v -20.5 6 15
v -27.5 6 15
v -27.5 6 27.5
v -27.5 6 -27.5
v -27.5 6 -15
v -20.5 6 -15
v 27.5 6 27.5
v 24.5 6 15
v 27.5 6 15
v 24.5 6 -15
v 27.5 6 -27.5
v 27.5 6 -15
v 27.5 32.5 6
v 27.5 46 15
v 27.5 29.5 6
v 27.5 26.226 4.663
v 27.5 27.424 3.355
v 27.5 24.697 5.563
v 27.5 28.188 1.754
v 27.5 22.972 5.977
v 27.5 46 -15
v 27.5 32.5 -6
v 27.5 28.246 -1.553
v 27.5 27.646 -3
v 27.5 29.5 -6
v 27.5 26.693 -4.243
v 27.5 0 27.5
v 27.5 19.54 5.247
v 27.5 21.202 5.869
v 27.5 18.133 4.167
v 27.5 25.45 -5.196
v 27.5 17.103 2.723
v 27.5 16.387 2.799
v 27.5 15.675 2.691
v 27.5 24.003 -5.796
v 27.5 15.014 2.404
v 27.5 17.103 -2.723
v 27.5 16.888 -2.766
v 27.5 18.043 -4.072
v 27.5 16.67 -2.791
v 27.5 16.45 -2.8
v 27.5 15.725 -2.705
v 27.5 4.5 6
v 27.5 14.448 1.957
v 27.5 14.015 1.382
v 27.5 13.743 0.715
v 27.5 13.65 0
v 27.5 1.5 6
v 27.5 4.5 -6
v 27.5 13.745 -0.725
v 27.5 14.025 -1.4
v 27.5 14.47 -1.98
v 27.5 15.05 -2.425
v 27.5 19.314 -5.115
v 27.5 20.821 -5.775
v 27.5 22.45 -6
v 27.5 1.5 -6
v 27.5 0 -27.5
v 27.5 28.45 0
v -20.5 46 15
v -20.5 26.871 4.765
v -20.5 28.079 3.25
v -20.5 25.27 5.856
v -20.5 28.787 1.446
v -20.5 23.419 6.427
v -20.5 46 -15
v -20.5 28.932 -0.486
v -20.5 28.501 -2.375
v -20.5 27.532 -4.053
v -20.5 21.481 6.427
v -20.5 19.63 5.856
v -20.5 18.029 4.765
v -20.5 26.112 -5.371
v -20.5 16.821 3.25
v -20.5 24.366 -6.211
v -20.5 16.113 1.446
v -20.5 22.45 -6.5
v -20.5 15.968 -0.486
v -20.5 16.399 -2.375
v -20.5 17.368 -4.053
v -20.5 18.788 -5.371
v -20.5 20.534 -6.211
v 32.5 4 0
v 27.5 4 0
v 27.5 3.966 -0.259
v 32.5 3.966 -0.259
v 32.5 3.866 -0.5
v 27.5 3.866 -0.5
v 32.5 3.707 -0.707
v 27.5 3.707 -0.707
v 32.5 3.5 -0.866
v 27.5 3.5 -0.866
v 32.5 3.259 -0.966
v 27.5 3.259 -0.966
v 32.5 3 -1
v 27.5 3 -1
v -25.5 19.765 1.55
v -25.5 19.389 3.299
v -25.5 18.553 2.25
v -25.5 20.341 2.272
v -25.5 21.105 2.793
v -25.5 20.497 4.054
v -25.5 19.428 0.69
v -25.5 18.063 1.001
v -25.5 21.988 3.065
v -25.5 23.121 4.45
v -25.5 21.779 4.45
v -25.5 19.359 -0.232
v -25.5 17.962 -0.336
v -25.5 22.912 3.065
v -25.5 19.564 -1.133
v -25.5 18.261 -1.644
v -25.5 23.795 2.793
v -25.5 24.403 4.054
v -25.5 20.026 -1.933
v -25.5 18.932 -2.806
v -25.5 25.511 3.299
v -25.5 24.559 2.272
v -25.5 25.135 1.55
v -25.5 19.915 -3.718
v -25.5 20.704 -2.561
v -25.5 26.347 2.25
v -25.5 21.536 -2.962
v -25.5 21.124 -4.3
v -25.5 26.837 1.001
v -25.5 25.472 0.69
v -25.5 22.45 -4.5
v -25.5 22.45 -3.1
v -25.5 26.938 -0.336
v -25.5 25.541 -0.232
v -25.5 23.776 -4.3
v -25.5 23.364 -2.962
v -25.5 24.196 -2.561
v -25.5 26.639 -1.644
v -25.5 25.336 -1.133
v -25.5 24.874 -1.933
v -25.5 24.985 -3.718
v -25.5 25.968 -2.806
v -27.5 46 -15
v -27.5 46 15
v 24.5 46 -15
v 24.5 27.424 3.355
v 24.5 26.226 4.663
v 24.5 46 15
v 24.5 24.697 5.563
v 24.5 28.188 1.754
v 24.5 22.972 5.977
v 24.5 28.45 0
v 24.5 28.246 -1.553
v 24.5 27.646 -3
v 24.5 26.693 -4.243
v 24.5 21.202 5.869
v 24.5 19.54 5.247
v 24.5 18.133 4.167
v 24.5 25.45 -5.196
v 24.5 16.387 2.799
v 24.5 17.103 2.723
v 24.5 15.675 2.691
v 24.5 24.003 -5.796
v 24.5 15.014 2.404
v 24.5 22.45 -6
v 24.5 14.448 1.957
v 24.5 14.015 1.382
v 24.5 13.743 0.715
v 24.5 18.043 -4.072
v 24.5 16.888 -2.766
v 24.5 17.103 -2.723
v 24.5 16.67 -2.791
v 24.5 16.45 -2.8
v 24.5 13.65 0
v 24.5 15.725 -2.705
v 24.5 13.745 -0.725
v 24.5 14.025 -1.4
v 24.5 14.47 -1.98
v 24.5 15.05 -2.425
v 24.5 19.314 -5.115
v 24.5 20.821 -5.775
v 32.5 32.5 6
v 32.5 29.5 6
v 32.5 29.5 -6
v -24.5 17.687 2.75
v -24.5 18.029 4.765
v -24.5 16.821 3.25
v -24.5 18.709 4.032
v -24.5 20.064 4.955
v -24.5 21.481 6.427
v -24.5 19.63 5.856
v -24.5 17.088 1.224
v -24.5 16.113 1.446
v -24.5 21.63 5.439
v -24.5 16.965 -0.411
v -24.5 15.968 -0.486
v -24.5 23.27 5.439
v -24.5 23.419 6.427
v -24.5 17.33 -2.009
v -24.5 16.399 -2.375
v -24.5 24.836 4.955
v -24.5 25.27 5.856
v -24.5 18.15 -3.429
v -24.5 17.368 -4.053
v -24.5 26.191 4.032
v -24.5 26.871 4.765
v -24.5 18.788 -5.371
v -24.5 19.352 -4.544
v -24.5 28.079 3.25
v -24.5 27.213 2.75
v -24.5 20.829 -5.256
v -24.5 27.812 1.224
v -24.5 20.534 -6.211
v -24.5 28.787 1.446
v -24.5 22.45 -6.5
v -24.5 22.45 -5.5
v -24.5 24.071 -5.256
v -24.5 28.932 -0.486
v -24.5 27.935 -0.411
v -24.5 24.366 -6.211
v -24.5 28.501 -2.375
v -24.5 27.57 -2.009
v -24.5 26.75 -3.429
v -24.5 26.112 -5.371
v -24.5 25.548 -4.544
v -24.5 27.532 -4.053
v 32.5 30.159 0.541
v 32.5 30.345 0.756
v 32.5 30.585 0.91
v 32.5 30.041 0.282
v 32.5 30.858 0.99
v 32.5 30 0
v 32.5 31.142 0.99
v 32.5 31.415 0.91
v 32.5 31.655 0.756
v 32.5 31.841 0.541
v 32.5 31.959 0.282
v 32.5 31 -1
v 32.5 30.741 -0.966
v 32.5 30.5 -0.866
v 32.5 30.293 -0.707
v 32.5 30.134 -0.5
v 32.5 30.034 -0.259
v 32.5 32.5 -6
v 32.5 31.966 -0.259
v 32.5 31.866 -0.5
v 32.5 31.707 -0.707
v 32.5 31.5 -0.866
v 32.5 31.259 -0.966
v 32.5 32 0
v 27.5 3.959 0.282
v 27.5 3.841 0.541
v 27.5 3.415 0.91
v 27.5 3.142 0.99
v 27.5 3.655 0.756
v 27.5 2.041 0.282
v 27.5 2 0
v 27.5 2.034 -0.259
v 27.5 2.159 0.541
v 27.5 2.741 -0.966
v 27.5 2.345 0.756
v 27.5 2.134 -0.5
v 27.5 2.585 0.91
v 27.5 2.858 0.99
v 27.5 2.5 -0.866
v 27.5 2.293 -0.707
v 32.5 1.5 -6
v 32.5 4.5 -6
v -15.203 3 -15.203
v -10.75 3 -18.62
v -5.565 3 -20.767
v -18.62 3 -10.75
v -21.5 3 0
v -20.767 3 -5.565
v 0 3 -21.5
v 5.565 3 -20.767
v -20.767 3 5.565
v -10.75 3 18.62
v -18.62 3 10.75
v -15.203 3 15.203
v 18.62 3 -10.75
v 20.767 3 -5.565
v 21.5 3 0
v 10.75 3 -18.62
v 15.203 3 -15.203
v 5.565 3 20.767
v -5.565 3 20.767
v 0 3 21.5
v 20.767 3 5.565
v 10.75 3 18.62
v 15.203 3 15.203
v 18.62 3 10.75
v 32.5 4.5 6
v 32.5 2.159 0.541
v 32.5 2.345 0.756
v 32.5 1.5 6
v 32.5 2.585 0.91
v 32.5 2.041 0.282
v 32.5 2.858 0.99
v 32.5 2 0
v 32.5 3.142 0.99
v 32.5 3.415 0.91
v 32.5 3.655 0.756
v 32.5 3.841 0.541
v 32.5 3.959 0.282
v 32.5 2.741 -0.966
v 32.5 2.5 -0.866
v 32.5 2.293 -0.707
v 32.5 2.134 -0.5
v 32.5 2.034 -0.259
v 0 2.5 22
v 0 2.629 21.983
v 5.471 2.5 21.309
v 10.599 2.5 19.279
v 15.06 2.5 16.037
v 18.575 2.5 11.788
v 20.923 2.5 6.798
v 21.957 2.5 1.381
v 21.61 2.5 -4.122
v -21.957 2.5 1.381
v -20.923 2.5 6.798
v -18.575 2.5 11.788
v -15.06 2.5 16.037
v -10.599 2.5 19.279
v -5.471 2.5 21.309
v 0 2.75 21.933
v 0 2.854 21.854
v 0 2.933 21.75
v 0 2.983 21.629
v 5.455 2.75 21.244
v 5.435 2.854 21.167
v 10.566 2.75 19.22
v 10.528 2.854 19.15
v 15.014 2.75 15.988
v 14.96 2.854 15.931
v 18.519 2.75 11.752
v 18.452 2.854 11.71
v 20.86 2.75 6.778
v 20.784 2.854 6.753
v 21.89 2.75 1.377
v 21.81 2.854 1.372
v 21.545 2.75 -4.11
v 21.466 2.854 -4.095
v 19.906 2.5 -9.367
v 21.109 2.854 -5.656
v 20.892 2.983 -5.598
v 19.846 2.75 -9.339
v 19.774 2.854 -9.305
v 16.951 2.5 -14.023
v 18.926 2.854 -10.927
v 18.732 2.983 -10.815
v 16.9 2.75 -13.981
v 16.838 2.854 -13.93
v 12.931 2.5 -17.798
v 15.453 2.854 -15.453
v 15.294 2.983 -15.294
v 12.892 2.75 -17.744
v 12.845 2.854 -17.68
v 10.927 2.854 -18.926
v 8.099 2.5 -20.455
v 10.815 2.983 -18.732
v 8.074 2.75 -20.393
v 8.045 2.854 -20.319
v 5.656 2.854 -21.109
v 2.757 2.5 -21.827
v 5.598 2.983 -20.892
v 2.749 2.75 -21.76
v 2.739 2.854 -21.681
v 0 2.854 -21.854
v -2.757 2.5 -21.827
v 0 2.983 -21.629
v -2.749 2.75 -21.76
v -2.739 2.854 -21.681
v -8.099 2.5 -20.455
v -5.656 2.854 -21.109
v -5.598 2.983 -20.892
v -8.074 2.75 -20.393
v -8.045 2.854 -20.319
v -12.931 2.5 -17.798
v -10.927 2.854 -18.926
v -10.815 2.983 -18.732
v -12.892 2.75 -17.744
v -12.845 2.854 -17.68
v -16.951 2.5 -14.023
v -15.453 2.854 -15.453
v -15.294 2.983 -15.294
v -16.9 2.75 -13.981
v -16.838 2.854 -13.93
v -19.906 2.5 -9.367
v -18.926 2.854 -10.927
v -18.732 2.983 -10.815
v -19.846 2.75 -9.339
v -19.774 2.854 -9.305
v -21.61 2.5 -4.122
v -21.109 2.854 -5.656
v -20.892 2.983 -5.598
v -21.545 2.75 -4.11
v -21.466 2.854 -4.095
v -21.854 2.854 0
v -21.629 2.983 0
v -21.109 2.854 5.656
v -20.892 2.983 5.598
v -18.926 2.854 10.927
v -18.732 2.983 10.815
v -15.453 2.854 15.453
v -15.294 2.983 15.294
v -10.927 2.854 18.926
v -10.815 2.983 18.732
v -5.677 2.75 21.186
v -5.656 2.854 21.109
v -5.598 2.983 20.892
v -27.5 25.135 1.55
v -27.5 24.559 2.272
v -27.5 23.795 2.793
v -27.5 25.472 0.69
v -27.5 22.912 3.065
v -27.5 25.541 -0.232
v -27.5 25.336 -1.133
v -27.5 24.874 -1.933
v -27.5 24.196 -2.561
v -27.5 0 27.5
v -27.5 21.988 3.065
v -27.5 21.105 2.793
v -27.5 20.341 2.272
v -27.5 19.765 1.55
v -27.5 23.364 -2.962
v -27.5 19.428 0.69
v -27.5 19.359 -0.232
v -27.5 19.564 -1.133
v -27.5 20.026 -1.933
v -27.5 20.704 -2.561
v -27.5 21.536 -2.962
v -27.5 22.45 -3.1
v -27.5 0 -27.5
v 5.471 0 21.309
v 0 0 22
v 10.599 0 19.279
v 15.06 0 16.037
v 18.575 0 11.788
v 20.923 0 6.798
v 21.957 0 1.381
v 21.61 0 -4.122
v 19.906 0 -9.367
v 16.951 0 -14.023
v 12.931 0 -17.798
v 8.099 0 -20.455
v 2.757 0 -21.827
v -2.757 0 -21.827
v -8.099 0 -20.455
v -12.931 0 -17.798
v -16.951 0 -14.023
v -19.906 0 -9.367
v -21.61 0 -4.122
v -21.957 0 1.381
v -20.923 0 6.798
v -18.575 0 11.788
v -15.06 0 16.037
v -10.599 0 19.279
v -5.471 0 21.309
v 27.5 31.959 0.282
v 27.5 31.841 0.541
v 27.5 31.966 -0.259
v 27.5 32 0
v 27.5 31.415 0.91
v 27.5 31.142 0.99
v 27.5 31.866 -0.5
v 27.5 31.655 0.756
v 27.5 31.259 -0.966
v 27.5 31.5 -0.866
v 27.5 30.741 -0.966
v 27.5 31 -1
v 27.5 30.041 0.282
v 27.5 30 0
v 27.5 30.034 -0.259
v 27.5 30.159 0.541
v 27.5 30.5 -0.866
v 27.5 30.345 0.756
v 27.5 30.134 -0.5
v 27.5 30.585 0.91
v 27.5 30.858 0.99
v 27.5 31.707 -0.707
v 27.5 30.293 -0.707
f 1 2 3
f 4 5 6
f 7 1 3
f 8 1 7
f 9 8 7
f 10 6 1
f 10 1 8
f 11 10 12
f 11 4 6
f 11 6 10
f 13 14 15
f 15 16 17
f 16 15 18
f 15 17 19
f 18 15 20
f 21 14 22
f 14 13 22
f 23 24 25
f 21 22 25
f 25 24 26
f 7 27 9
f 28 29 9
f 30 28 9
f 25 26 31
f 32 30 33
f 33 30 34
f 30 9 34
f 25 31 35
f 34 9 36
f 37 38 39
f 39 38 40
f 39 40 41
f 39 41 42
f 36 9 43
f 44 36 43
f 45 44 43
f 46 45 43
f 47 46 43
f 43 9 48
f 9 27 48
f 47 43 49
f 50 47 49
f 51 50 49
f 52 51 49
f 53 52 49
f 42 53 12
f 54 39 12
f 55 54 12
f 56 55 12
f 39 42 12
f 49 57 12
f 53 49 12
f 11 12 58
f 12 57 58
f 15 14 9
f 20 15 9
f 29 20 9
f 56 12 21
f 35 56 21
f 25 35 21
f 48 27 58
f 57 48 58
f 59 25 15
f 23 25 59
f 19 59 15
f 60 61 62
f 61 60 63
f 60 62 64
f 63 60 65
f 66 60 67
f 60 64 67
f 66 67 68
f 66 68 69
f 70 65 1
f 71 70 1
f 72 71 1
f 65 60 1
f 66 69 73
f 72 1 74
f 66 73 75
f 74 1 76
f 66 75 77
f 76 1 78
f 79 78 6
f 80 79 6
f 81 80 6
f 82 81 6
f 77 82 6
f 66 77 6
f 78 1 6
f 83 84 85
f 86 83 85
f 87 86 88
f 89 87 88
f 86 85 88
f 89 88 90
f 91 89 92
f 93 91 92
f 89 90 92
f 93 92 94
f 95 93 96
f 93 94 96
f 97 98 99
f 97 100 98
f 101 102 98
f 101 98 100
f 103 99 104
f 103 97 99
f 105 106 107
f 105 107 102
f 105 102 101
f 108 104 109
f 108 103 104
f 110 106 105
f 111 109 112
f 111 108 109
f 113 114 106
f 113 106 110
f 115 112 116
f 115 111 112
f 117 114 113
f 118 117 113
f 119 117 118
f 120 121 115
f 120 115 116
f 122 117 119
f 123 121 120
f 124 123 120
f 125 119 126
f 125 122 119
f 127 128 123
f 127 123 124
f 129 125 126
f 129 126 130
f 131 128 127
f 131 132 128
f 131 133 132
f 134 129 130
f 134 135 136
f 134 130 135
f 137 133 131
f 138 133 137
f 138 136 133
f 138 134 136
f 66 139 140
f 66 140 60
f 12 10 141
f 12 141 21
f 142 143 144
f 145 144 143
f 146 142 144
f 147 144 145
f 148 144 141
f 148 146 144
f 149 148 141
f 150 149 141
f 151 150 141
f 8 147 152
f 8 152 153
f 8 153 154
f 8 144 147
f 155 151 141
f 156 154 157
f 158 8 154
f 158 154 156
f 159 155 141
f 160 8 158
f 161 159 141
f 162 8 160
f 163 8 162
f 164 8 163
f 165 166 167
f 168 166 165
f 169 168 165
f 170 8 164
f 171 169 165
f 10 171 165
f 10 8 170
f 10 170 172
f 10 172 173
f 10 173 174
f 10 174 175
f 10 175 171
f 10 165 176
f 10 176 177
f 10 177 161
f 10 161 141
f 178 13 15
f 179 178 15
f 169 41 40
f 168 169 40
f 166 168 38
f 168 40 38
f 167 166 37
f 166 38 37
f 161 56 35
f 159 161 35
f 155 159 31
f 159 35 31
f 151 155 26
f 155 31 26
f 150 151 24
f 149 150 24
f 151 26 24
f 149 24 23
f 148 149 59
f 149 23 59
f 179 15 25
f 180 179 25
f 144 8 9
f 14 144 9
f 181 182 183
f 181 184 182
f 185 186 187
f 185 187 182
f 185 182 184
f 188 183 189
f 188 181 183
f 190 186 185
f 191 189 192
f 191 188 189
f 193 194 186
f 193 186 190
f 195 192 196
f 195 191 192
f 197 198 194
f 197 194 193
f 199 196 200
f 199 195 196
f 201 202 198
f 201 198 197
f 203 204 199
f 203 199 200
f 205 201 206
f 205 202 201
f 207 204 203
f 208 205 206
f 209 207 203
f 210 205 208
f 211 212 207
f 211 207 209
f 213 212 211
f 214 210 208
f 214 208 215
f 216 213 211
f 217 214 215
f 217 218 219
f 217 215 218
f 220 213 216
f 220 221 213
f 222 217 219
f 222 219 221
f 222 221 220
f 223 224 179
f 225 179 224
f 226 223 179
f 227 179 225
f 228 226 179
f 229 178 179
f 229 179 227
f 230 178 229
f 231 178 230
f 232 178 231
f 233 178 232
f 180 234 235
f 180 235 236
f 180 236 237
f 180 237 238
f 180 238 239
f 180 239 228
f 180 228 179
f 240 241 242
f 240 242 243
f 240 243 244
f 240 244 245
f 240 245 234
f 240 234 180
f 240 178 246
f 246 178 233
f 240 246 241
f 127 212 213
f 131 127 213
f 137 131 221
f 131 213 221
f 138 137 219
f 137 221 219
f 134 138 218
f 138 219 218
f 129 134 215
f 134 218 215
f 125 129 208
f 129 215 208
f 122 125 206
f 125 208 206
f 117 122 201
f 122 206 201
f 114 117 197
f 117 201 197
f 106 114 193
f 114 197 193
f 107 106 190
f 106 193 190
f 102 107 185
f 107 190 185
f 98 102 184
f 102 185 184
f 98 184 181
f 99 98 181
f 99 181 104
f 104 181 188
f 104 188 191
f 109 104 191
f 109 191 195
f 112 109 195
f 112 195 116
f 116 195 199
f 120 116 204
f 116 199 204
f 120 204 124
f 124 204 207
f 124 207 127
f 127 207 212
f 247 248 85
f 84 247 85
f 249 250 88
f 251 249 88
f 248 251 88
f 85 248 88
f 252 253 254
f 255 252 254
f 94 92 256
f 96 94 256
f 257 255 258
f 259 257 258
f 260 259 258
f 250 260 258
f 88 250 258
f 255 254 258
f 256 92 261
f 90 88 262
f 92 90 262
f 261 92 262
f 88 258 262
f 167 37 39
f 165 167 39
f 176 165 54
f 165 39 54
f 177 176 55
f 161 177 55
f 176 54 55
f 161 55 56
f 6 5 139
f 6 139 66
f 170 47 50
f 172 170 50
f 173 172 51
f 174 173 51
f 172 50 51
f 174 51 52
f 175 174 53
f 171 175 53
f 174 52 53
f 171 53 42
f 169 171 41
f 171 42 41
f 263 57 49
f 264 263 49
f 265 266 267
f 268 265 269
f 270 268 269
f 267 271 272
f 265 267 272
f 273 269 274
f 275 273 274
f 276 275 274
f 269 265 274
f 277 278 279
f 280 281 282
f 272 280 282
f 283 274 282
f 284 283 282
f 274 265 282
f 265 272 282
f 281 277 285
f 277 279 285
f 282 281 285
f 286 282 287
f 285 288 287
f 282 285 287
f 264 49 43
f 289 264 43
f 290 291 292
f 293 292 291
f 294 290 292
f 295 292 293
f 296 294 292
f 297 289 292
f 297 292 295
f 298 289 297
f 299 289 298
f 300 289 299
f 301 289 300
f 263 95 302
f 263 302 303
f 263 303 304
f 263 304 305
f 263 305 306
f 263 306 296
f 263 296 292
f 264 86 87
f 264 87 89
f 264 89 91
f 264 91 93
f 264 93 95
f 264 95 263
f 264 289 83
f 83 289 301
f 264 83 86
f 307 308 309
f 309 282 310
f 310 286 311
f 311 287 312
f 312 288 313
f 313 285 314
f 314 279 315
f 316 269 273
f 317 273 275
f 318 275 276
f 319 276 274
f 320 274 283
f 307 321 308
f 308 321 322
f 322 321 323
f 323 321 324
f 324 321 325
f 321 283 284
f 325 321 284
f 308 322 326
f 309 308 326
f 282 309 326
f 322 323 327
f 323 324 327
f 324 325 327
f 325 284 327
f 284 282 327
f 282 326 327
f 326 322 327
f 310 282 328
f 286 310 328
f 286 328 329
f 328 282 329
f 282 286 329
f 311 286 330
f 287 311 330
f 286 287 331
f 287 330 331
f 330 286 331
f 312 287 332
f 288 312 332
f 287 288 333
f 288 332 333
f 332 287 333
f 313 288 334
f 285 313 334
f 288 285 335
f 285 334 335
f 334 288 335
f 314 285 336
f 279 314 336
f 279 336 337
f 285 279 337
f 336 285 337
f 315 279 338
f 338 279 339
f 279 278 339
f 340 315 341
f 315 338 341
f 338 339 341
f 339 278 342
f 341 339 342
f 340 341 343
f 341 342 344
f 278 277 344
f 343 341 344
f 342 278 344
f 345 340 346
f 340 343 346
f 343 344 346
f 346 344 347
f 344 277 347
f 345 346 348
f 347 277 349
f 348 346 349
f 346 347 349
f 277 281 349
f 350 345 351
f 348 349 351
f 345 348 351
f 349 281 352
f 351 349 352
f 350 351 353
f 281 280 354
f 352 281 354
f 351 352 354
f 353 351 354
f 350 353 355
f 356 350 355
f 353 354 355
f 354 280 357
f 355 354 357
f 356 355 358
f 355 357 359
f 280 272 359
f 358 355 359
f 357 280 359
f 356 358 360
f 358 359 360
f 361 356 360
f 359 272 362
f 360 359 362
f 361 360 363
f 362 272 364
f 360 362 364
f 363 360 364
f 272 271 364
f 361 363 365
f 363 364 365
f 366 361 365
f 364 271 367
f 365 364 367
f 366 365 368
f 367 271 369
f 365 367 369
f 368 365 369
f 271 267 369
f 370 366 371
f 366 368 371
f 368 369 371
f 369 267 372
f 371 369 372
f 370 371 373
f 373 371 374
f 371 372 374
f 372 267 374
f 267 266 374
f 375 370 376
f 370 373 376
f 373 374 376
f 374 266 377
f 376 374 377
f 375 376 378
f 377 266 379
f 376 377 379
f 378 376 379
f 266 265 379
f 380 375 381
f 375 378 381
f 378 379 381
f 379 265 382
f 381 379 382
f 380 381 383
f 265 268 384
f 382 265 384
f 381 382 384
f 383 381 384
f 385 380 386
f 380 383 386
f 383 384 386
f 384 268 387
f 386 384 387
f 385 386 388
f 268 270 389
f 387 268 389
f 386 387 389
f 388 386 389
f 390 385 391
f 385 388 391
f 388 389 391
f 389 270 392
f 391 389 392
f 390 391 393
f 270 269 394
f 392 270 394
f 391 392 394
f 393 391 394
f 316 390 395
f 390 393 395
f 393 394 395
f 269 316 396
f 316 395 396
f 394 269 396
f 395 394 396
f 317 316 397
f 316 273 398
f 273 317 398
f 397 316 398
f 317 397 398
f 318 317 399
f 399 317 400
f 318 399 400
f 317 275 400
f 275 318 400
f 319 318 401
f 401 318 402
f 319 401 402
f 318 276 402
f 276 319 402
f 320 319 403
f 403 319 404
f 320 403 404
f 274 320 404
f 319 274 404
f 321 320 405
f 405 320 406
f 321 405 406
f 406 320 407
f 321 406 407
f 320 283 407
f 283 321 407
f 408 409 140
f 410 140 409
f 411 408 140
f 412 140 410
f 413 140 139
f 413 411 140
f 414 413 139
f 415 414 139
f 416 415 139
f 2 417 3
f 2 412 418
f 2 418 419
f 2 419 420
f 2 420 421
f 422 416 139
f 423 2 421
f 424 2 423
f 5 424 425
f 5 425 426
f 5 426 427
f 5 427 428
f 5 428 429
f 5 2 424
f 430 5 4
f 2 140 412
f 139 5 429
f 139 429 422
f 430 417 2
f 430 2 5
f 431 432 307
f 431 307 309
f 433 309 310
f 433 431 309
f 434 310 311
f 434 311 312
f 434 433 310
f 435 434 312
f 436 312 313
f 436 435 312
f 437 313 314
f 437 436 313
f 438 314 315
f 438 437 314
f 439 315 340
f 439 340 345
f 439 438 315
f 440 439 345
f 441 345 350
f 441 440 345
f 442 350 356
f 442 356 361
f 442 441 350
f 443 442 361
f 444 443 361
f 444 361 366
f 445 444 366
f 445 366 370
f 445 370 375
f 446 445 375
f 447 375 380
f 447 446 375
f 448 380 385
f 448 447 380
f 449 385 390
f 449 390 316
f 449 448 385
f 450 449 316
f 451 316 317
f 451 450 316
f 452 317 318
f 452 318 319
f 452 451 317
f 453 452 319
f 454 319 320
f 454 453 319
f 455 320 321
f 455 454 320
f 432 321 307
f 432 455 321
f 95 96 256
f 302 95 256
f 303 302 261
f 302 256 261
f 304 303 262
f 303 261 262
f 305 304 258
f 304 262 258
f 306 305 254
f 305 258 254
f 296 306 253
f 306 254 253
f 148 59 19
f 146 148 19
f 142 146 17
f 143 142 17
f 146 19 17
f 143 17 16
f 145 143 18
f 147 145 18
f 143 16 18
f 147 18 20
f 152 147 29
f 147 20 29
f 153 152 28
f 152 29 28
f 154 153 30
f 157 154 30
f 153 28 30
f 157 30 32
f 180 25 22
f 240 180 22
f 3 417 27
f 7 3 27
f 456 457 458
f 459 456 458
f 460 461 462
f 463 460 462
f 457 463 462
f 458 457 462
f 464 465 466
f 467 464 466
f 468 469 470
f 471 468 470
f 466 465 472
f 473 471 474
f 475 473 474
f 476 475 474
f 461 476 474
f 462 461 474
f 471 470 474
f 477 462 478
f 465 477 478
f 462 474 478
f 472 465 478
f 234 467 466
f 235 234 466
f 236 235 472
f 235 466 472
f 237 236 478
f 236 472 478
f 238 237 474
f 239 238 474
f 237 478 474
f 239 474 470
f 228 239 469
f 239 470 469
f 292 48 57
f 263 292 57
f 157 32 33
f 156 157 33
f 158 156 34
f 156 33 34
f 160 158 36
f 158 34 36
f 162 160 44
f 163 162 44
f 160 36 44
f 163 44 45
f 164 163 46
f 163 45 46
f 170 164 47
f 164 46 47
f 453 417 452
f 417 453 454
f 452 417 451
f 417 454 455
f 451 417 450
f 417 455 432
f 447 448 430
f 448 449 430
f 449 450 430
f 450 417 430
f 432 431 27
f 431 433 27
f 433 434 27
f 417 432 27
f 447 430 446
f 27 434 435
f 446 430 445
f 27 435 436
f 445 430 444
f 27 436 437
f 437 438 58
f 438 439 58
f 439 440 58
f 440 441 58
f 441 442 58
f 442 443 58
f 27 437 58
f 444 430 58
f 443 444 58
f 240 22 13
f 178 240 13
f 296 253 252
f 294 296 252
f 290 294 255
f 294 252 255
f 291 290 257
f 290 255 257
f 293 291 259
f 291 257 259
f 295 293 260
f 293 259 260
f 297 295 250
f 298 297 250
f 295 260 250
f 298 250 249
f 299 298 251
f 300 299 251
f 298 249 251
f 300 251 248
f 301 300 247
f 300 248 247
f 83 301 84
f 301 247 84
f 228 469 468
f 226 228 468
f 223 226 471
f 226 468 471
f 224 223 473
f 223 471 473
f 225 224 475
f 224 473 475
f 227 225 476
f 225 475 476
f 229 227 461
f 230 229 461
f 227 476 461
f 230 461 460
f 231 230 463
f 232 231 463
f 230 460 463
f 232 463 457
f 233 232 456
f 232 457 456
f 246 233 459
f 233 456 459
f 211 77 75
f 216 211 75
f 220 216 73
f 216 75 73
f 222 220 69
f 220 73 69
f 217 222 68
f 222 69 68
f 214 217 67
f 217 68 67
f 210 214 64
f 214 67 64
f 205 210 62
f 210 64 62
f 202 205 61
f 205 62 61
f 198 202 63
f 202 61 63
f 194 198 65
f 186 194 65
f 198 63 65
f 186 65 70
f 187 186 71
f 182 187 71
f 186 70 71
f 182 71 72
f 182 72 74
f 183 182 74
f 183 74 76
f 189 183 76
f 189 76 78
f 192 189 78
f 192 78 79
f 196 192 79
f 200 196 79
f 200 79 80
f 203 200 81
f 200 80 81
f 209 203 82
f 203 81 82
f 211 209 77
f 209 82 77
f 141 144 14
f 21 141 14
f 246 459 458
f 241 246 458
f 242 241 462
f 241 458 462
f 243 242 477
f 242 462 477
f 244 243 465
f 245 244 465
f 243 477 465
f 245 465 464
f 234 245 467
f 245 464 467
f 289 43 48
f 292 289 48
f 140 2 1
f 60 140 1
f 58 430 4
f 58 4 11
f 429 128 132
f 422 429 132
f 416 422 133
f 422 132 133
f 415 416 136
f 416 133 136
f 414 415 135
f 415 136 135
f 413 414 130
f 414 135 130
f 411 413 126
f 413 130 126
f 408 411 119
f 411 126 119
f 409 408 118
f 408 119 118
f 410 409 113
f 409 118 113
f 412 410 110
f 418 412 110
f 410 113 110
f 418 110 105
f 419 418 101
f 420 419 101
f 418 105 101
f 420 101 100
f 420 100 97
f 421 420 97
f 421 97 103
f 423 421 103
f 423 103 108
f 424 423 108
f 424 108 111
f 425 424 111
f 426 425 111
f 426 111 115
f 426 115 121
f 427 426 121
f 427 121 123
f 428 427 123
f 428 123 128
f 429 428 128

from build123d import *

# Parameters (mm, degrees)
CROQUIS8_W              = 55
CROQUIS8_H              = 55
CROQUIS8_R              = 22
SALIENTE_EXTRUIR4_DEPTH = 6
CROQUIS8_3_R            = 22
CORTAR_EXTRUIR6_DEPTH   = 3
REDONDEO1_R             = 0.5
CROQUIS9_W              = 7
CROQUIS9_H              = 30
CROQUIS9_W_2            = 3
SALIENTE_EXTRUIR5_DEPTH = 40
SALIENTE_EXTRUIR6_DEPTH = 5
CORTAR_EXTRUIR7_DEPTH   = 5
CORTAR_EXTRUIR8_REACH   = 77.374
CROQUIS11_R             = 3.1
CROQUIS11_3_R           = 6.5
CORTAR_EXTRUIR9_DEPTH   = 4
CROQUIS12_R             = 5.5
CROQUIS12_R_2           = 3.1
CORTAR_EXTRUIR10_DEPTH  = 1
CHAFL_N1_SIZE           = 1


with BuildPart() as part:
    # Croquis8 → Saliente-Extruir4 (new body)
    # profile 1 of 2: a face of its own
    with BuildSketch(Plane(origin=(0, 0, 0), x_dir=(1, 0, 0), z_dir=(0, 1, 0))):
        Rectangle(CROQUIS8_W, CROQUIS8_H)
        Circle(CROQUIS8_R, mode=Mode.SUBTRACT)
    # profile 2 of 2: a face of its own
    with BuildSketch(Plane(origin=(0, 0, 0), x_dir=(1, 0, 0), z_dir=(0, 1, 0))):
        Circle(CROQUIS8_R)
    extrude(amount=SALIENTE_EXTRUIR4_DEPTH)

    # Croquis8<3> → Cortar-Extruir6 (cut)
    with BuildSketch(Plane(origin=(0, 0, 0), x_dir=(1, 0, 0), z_dir=(0, 1, 0))):
        with Locations(Location((0, 0, 0), (0, 0, 270))):
            Circle(CROQUIS8_3_R)
    extrude(amount=CORTAR_EXTRUIR6_DEPTH, mode=Mode.SUBTRACT)

    # Redondeo1
    redondeo1_edges = [part.edges().sort_by_distance(p)[0] for p in [
        (0, 3, -22),
    ]]
    fillet(redondeo1_edges, radius=REDONDEO1_R)

    # Croquis9 → Saliente-Extruir5 (add)
    with BuildSketch(Plane(origin=(0, 6, 0), x_dir=(1, 0, 0), z_dir=(0, 1, 0))):
        with Locations((-24, 0)):
            Rectangle(CROQUIS9_W, CROQUIS9_H)
        with Locations((26, 0)):
            Rectangle(CROQUIS9_W_2, CROQUIS9_H)
    extrude(amount=SALIENTE_EXTRUIR5_DEPTH)

    # Croquis10 → Saliente-Extruir6 (add)
    with BuildSketch(Plane(origin=(27.5, 0, 0), x_dir=(0, 0, -1), z_dir=(1, 0, 0))):
        with BuildLine():
            Line((0, 2), (0, 1.5))
            Line((0, 1.5), (6, 1.5))
            Line((6, 1.5), (6, 4.5))
            Line((6, 4.5), (0, 4.5))
            Line((0, 4.5), (0, 4))
            ThreePointArc((0, 4), (0.707106781, 3.707106781), (1, 3))
            ThreePointArc((1, 3), (0.707106781, 2.292893219), (0, 2))
        make_face()
        with BuildLine():
            Line((-6, 1.5), (0, 1.5))
            Line((0, 1.5), (0, 2))
            ThreePointArc((0, 2), (-1, 3), (0, 4))
            Line((0, 4), (0, 4.5))
            Line((0, 4.5), (-6, 4.5))
            Line((-6, 4.5), (-6, 1.5))
        make_face()
        with BuildLine():
            Line((-6, 29.5), (0, 29.5))
            Line((0, 29.5), (0, 30))
            ThreePointArc((0, 30), (-1, 31), (0, 32))
            Line((0, 32), (0, 32.5))
            Line((0, 32.5), (-6, 32.5))
            Line((-6, 32.5), (-6, 29.5))
        make_face()
        with BuildLine():
            Line((0, 30), (0, 29.5))
            Line((0, 29.5), (6, 29.5))
            Line((6, 29.5), (6, 32.5))
            Line((6, 32.5), (0, 32.5))
            Line((0, 32.5), (0, 32))
            ThreePointArc((0, 32), (0.707106781, 31.707106781), (1, 31))
            ThreePointArc((1, 31), (0.707106781, 30.292893219), (0, 30))
        make_face()
    extrude(amount=SALIENTE_EXTRUIR6_DEPTH)

    # Croquis10<3> → Cortar-Extruir7 (cut)
    with BuildSketch(Plane(origin=(27.5, 0, 0), x_dir=(0, 0, -1), z_dir=(1, 0, 0))):
        with BuildLine():
            ThreePointArc((-2.722711067, 17.103333333), (-2.198787545, 14.716410275), (0, 13.65))
            Line((0, 13.65), (0, 16.45))
            ThreePointArc((0, 16.45), (-1.4, 16.615619142), (-2.722711067, 17.103333333))
        make_face()
        with BuildLine():
            Line((0, 16.45), (0, 13.65))
            ThreePointArc((0, 13.65), (1.979898987, 14.470101013), (2.8, 16.45))
            ThreePointArc((2.8, 16.45), (2.780610633, 16.778944533), (2.722711067, 17.103333333))
            ThreePointArc((2.722711067, 17.103333333), (1.4, 16.615619142), (0, 16.45))
        make_face()
        with BuildLine():
            ThreePointArc((-2.722711067, 17.103333333), (-1.4, 16.615619142), (0, 16.45))
            Line((0, 16.45), (0, 19.25))
            ThreePointArc((0, 19.25), (-1.733589725, 18.648787545), (-2.722711067, 17.103333333))
        make_face()
        with BuildLine():
            Line((0, 19.25), (0, 16.45))
            ThreePointArc((0, 16.45), (1.4, 16.615619142), (2.722711067, 17.103333333))
            ThreePointArc((2.722711067, 17.103333333), (1.733589725, 18.648787545), (0, 19.25))
        make_face()
        with BuildLine():
            ThreePointArc((0, 28.45), (-5.834380858, 23.85), (-2.722711067, 17.103333333))
            ThreePointArc((-2.722711067, 17.103333333), (-1.733589725, 18.648787545), (0, 19.25))
            Line((0, 19.25), (0, 28.45))
        make_face()
        with BuildLine():
            Line((0, 28.45), (0, 19.25))
            ThreePointArc((0, 19.25), (1.733589725, 18.648787545), (2.722711067, 17.103333333))
            ThreePointArc((2.722711067, 17.103333333), (5.115479763, 19.314419225), (6, 22.45))
            ThreePointArc((6, 22.45), (4.242640687, 26.692640687), (0, 28.45))
        make_face()
    extrude(amount=-CORTAR_EXTRUIR7_DEPTH, mode=Mode.SUBTRACT)

    # Croquis11 → Cortar-Extruir8 (cut, up to next)
    with BuildSketch(Plane(origin=(-20.5, 0, 0), x_dir=(0, 0, -1), z_dir=(1, 0, 0)), mode=Mode.PRIVATE) as cortar_extruir8_sk1:
        with Locations((0, 22.45)):
            Circle(CROQUIS11_R)
    cortar_extruir8_tool1 = extrude(cortar_extruir8_sk1.sketch, amount=-CORTAR_EXTRUIR8_REACH, mode=Mode.PRIVATE) & part.part
    add(cortar_extruir8_tool1.solids().sort_by_distance((-20.5, 22.45, 0))[0], mode=Mode.SUBTRACT)

    # Croquis11<3> → Cortar-Extruir9 (cut)
    with BuildSketch(Plane(origin=(-20.5, 0, 0), x_dir=(0, 0, -1), z_dir=(1, 0, 0))):
        with Locations((0, 22.45)):
            Circle(CROQUIS11_3_R)
    extrude(amount=-CORTAR_EXTRUIR9_DEPTH, mode=Mode.SUBTRACT)

    # Croquis12 → Cortar-Extruir10 (cut)
    with BuildSketch(Plane(origin=(-24.5, 0, 0), x_dir=(0, 0, -1), z_dir=(1, 0, 0))):
        with Locations((0, 22.45)):
            Circle(CROQUIS12_R)
        with Locations((0, 22.45)):
            Circle(CROQUIS12_R_2, mode=Mode.SUBTRACT)
    extrude(amount=-CORTAR_EXTRUIR10_DEPTH, mode=Mode.SUBTRACT)

    # Chaflán1
    chafl_n1_edges = [part.edges().sort_by_distance(p)[0] for p in [
        (-25.5, 22.45, 5.5),
    ]]
    chamfer(chafl_n1_edges, length=CHAFL_N1_SIZE - 0.0001)  # a hair under: the kernel refuses the full size


solid = part.part
